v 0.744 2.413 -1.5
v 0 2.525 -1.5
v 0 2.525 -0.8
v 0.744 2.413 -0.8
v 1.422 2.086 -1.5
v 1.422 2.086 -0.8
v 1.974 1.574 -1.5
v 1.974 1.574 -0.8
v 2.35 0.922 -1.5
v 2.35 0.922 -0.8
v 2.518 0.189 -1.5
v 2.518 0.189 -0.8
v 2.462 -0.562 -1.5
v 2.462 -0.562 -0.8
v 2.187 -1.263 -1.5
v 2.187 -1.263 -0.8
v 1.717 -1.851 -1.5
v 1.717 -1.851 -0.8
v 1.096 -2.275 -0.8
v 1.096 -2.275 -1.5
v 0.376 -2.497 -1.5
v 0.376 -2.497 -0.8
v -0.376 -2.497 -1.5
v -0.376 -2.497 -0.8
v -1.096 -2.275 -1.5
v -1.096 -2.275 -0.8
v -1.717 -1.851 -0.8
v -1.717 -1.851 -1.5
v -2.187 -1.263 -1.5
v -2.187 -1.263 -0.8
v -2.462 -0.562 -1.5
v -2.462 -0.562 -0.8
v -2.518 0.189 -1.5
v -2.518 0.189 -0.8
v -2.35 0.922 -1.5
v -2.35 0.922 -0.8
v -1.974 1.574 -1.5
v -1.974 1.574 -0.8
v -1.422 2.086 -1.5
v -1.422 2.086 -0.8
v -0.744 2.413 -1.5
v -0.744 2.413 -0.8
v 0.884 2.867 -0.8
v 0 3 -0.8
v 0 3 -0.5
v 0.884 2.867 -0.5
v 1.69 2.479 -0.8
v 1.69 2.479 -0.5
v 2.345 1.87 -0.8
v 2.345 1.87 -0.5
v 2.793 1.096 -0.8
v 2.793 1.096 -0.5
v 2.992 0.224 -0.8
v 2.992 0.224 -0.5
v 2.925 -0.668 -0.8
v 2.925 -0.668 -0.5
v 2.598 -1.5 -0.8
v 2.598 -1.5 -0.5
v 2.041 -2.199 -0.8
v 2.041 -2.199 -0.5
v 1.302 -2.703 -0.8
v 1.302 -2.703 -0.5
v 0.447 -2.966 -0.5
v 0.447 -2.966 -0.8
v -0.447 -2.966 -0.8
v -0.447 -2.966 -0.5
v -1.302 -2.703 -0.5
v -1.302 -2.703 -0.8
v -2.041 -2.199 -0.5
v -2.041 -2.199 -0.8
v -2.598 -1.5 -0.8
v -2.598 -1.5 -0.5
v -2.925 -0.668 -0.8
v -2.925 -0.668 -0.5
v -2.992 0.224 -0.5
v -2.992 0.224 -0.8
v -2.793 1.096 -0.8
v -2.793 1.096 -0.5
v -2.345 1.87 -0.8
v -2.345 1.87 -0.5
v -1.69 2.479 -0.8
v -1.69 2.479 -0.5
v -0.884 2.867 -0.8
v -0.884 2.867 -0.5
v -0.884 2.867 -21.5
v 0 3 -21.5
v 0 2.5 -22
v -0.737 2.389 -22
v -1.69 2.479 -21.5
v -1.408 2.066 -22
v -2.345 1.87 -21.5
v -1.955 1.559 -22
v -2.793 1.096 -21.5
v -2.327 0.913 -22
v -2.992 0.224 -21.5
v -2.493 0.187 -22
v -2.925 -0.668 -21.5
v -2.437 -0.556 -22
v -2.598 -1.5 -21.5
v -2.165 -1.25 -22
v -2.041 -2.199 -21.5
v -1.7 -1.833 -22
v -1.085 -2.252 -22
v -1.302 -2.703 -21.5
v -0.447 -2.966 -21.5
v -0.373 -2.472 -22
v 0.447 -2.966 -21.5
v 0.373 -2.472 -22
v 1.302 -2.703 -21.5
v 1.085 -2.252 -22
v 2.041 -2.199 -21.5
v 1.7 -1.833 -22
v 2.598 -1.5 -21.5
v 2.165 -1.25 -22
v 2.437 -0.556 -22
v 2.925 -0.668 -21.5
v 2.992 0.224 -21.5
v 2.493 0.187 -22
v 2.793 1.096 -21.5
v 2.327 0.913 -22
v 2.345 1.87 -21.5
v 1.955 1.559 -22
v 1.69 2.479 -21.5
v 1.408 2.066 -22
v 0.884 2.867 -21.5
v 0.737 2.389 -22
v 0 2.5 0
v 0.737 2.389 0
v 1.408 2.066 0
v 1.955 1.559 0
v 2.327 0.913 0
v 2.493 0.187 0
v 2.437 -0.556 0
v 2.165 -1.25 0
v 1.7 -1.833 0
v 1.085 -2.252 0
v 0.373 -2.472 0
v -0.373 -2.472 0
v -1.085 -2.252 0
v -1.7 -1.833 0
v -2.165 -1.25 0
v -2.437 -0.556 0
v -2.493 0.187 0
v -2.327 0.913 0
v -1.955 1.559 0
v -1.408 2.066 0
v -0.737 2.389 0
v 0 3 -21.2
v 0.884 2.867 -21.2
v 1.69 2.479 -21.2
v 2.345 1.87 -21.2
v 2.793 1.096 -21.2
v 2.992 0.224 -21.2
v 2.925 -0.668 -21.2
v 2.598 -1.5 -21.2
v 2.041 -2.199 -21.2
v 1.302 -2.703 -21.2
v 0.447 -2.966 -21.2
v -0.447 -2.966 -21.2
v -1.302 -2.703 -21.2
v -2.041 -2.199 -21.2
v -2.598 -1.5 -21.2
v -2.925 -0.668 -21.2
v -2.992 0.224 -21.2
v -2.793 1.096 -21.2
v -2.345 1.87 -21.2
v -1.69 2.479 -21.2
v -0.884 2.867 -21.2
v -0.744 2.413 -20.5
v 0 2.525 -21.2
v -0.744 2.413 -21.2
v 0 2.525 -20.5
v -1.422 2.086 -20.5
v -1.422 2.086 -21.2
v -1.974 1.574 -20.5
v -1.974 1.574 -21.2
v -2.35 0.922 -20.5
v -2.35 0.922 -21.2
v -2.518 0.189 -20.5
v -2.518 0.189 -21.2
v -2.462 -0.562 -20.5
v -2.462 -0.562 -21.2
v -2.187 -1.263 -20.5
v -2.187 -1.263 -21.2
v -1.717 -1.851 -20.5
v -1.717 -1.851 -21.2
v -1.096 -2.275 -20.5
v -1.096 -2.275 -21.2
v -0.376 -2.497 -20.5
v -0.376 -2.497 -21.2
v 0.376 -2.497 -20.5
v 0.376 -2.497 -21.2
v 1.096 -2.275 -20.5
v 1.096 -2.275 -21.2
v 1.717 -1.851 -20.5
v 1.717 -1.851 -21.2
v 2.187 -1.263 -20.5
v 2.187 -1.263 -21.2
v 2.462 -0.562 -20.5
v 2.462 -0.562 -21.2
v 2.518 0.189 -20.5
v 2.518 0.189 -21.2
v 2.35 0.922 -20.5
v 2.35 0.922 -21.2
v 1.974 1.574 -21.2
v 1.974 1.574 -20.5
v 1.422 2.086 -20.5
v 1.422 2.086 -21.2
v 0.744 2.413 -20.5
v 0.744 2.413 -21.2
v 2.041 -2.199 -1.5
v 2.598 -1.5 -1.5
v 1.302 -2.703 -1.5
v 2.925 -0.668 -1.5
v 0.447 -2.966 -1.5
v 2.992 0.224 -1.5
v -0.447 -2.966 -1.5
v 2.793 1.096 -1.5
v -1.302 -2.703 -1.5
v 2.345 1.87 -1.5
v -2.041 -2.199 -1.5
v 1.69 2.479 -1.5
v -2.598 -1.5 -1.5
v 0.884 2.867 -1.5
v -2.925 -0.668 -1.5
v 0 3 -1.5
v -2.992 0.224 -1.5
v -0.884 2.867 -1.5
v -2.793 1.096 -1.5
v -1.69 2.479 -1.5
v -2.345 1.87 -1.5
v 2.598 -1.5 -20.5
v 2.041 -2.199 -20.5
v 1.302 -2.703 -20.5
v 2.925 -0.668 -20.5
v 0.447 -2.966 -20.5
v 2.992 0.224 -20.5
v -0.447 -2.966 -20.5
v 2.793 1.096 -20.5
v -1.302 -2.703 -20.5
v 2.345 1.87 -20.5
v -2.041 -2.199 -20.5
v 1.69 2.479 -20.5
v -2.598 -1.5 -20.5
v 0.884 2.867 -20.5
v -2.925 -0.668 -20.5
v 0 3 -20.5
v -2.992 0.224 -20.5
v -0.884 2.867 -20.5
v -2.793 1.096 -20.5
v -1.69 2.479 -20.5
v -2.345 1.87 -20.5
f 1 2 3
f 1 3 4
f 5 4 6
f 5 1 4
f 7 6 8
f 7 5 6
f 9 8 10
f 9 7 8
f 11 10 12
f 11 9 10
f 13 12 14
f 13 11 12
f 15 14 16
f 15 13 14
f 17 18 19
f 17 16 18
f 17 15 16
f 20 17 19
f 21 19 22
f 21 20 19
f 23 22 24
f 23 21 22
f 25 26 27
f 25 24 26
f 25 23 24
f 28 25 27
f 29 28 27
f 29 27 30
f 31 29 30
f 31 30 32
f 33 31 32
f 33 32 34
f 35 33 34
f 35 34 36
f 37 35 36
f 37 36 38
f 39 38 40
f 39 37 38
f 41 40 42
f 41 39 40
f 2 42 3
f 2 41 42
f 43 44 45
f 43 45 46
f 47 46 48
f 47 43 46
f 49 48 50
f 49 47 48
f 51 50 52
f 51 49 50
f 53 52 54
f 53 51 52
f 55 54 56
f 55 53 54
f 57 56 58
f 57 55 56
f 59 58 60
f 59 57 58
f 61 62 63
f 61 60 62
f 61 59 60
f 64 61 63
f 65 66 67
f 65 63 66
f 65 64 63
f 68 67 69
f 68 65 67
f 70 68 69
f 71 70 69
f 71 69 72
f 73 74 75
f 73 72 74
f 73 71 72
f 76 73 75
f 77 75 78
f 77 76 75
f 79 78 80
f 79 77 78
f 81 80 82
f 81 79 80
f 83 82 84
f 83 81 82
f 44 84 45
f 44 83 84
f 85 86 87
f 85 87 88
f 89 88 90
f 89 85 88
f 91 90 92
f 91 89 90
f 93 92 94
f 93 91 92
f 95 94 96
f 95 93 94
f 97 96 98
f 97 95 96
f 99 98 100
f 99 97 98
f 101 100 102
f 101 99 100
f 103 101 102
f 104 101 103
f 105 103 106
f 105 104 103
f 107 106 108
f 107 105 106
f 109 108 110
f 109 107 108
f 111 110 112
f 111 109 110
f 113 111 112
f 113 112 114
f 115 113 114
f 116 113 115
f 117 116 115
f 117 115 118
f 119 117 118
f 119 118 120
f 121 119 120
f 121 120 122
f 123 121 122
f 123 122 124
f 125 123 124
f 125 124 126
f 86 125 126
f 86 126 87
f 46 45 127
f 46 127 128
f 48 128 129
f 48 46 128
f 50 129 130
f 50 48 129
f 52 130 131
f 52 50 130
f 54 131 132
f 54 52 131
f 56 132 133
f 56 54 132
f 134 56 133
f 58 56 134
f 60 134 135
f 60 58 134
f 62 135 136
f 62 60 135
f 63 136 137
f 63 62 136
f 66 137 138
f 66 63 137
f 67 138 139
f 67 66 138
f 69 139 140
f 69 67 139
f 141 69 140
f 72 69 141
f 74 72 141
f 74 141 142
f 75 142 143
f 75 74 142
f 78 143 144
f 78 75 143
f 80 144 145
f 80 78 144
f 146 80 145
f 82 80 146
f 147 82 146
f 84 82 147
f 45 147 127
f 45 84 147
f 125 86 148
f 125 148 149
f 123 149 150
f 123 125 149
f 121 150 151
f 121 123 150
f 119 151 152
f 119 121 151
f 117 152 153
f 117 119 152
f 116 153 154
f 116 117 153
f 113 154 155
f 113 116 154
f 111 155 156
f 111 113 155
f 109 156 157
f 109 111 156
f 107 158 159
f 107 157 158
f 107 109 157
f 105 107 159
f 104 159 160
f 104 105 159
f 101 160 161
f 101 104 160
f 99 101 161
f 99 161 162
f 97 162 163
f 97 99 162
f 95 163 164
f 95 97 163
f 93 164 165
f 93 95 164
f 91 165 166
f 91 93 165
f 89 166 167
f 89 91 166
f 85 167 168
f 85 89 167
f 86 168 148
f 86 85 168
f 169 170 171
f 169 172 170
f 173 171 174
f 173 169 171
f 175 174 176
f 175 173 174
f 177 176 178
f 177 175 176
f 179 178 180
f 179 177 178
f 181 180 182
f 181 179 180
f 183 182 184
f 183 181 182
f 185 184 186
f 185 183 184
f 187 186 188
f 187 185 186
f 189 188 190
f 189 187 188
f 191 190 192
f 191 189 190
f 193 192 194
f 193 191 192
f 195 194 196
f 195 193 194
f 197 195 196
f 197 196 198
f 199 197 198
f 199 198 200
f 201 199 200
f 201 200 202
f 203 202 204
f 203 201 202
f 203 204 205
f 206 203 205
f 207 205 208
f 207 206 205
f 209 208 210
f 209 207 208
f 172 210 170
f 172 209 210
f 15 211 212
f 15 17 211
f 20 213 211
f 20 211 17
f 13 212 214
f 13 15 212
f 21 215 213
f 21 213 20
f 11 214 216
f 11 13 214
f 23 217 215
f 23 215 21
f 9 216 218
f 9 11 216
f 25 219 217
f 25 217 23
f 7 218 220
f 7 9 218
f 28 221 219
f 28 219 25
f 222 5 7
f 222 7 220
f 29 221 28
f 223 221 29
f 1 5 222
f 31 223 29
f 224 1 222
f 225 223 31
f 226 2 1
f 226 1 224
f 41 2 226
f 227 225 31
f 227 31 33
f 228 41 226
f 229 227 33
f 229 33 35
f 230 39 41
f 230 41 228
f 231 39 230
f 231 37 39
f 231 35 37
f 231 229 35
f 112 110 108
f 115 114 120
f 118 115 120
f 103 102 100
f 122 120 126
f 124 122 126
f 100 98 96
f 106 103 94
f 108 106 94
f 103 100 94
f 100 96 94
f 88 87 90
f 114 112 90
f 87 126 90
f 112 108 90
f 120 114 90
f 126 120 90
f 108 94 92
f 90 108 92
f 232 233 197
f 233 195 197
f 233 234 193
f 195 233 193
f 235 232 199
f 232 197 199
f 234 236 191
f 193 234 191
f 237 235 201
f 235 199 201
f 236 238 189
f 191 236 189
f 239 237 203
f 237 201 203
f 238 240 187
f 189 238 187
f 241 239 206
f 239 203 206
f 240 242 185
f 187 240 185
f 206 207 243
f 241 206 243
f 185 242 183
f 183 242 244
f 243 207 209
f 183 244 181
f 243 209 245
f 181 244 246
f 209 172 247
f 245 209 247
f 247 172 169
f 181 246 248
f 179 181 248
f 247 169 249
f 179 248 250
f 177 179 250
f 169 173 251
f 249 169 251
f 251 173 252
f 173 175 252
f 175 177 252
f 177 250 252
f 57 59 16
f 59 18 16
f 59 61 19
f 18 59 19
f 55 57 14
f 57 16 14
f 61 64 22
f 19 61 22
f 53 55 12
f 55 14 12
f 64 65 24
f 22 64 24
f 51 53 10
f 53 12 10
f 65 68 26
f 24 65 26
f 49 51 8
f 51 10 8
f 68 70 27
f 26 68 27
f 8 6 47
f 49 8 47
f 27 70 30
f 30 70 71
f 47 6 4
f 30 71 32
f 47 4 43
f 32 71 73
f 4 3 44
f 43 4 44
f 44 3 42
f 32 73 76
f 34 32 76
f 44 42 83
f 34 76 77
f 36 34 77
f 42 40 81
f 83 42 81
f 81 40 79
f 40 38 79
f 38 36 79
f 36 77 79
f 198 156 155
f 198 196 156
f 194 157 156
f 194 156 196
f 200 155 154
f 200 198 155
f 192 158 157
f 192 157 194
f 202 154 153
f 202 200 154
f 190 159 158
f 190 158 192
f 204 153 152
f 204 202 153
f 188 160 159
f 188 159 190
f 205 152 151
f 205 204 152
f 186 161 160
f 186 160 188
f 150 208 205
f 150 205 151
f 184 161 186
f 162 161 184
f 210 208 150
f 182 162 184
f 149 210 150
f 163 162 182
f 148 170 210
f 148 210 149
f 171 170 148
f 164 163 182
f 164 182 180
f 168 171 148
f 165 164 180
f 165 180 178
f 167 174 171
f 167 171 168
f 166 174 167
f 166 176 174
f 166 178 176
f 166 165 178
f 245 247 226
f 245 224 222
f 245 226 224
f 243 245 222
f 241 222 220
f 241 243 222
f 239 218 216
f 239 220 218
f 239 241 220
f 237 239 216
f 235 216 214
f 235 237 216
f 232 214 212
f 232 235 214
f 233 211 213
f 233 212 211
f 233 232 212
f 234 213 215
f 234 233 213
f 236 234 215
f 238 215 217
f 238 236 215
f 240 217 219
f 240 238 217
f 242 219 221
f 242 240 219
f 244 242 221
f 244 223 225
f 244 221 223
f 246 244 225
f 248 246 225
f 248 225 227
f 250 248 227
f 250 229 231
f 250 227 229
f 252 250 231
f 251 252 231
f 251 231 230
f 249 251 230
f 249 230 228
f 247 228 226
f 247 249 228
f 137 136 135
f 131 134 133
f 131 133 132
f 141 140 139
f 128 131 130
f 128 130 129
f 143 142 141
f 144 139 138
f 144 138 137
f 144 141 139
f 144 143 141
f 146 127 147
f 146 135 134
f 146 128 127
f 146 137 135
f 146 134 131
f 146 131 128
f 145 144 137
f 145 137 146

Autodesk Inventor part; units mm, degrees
ref_plane "YZ Plane" through (0, 0, 0) normal (1, 0, 0) x (0, 1, 0)
ref_plane "XZ Plane" through (0, 0, 0) normal (0, 1, 0) x (-1, 0, 0)
ref_plane "XY Plane" through (0, 0, 0) normal (0, 0, 1) x (1, 0, 0)
sketch "Sketch1" plane through (0, 0, 0) normal (1, 0, 0) x (0, 1, 0)
  line L0 (0, 0) -> (3, 0)
  line L1 (3, 0) -> (3, -22)
  line L2 (3, -22) -> (0, -22)
  line L3 (0, -22) -> (0, 0)
  line L4 (3, -0.8) -> (2.525, -0.8)
  line L5 (2.525, -0.8) -> (2.525, -1.5)
  line L6 (2.525, -1.5) -> (3, -1.5)
  line L7 (3, -1.5) -> (3, -0.8)
  line L8 (3, -21.2) -> (2.525, -21.2)
  line L9 (2.525, -21.2) -> (2.525, -20.5)
  line L10 (2.525, -20.5) -> (3, -20.5)
  line L11 (3, -20.5) -> (3, -21.2)
  point P0 (2.525, -20.85)
  point P1 (3, -20.5)
  point P2 (1.5, -22)
  dimension "d0" = 6
  dimension "d1" = 19
  dimension "d4" = 0.7
  dimension "d5" = 0.7
  dimension "d6" = 5.05
  dimension "d11" = 22
  dimension "d12" = 0.8
revolve "Revolution1" add sketch "Sketch1" angle 360 about axis through (0, 0, -22) along (0, 0, 1) contours L0 L1 L4 L5 L6 L10 L9 L8 L2 L3
chamfer "Chamfer1" distance 0.5 angle 45 2 edges at (0, -3, 0) (0, -3, -22)
equation "\"d5\" = d4"
properties part number "D6 L20 rod pin" material "Steel, Carbon"
